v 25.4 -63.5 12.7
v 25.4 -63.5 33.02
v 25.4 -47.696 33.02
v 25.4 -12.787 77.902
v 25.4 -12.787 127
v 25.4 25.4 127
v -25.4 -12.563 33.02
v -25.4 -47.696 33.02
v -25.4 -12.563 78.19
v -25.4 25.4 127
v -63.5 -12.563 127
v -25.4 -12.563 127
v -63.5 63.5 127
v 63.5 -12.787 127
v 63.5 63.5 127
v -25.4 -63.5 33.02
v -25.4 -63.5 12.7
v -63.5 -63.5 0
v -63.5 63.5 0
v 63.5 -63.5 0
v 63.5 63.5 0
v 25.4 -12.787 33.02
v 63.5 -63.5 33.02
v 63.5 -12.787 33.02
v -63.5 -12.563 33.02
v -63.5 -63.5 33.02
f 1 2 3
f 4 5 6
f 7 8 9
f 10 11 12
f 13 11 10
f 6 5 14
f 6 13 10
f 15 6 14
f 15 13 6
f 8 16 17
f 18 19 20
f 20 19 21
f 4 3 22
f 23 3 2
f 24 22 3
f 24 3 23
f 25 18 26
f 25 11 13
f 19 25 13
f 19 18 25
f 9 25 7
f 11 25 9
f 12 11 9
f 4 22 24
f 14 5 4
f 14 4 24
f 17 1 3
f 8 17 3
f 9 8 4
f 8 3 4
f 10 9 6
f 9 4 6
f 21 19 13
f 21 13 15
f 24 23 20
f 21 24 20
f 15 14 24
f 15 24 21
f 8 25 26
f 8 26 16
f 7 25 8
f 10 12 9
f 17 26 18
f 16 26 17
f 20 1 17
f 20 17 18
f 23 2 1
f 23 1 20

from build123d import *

# Parameters (mm, degrees)
F0_W      = 127
F0_H      = 127
F1_DEPTH  = 127
F4_DEPTH  = 88.9
F5_W      = 38.1
F5_H      = 88.9
F6_DEPTH  = 127
F7_W      = 38.1
F7_H      = 50.712608
F7_H_2    = 50.8
F8_DEPTH  = 93.98
F9_W      = 38.1
F9_H      = 93.98
F10_DEPTH = 12.7


with BuildPart() as f1:
    # F0 (on Top) → F1 (new body)
    with BuildSketch(Plane.XY):
        Rectangle(F0_W, F0_H)
    extrude(amount=F1_DEPTH)

    # F3 (on face) → F4 (cut)
    with BuildSketch(Plane.YZ.offset(63.5)):
        Polygon((-63.5, 127), (-63.5, 12.7), (25.4, 127), align=None)
    extrude(amount=-F4_DEPTH, mode=Mode.SUBTRACT)

    # F5 (on face) → F6 (join)
    with BuildSketch(Plane.XY.offset(127)):
        with Locations((44.45, -19.05)):
            Rectangle(F5_W, F5_H)
    extrude(amount=-F6_DEPTH)

    # F7 (on face) → F8 (cut)
    with BuildSketch(Plane.XY.offset(127)):
        with Locations((44.45, -38.143696)):
            Rectangle(F7_W, F7_H)
        with Locations((-44.45, -37.963312)):
            Rectangle(F7_W, F7_H_2)
    extrude(amount=-F8_DEPTH, mode=Mode.SUBTRACT)

    # F9 (on face) → F10 (cut)
    with BuildSketch(Plane.XZ.offset(63.5)):
        with Locations((-44.45, 80.01)):
            Rectangle(F9_W, F9_H)
    extrude(amount=-F10_DEPTH, mode=Mode.SUBTRACT)


solid = f1.part
